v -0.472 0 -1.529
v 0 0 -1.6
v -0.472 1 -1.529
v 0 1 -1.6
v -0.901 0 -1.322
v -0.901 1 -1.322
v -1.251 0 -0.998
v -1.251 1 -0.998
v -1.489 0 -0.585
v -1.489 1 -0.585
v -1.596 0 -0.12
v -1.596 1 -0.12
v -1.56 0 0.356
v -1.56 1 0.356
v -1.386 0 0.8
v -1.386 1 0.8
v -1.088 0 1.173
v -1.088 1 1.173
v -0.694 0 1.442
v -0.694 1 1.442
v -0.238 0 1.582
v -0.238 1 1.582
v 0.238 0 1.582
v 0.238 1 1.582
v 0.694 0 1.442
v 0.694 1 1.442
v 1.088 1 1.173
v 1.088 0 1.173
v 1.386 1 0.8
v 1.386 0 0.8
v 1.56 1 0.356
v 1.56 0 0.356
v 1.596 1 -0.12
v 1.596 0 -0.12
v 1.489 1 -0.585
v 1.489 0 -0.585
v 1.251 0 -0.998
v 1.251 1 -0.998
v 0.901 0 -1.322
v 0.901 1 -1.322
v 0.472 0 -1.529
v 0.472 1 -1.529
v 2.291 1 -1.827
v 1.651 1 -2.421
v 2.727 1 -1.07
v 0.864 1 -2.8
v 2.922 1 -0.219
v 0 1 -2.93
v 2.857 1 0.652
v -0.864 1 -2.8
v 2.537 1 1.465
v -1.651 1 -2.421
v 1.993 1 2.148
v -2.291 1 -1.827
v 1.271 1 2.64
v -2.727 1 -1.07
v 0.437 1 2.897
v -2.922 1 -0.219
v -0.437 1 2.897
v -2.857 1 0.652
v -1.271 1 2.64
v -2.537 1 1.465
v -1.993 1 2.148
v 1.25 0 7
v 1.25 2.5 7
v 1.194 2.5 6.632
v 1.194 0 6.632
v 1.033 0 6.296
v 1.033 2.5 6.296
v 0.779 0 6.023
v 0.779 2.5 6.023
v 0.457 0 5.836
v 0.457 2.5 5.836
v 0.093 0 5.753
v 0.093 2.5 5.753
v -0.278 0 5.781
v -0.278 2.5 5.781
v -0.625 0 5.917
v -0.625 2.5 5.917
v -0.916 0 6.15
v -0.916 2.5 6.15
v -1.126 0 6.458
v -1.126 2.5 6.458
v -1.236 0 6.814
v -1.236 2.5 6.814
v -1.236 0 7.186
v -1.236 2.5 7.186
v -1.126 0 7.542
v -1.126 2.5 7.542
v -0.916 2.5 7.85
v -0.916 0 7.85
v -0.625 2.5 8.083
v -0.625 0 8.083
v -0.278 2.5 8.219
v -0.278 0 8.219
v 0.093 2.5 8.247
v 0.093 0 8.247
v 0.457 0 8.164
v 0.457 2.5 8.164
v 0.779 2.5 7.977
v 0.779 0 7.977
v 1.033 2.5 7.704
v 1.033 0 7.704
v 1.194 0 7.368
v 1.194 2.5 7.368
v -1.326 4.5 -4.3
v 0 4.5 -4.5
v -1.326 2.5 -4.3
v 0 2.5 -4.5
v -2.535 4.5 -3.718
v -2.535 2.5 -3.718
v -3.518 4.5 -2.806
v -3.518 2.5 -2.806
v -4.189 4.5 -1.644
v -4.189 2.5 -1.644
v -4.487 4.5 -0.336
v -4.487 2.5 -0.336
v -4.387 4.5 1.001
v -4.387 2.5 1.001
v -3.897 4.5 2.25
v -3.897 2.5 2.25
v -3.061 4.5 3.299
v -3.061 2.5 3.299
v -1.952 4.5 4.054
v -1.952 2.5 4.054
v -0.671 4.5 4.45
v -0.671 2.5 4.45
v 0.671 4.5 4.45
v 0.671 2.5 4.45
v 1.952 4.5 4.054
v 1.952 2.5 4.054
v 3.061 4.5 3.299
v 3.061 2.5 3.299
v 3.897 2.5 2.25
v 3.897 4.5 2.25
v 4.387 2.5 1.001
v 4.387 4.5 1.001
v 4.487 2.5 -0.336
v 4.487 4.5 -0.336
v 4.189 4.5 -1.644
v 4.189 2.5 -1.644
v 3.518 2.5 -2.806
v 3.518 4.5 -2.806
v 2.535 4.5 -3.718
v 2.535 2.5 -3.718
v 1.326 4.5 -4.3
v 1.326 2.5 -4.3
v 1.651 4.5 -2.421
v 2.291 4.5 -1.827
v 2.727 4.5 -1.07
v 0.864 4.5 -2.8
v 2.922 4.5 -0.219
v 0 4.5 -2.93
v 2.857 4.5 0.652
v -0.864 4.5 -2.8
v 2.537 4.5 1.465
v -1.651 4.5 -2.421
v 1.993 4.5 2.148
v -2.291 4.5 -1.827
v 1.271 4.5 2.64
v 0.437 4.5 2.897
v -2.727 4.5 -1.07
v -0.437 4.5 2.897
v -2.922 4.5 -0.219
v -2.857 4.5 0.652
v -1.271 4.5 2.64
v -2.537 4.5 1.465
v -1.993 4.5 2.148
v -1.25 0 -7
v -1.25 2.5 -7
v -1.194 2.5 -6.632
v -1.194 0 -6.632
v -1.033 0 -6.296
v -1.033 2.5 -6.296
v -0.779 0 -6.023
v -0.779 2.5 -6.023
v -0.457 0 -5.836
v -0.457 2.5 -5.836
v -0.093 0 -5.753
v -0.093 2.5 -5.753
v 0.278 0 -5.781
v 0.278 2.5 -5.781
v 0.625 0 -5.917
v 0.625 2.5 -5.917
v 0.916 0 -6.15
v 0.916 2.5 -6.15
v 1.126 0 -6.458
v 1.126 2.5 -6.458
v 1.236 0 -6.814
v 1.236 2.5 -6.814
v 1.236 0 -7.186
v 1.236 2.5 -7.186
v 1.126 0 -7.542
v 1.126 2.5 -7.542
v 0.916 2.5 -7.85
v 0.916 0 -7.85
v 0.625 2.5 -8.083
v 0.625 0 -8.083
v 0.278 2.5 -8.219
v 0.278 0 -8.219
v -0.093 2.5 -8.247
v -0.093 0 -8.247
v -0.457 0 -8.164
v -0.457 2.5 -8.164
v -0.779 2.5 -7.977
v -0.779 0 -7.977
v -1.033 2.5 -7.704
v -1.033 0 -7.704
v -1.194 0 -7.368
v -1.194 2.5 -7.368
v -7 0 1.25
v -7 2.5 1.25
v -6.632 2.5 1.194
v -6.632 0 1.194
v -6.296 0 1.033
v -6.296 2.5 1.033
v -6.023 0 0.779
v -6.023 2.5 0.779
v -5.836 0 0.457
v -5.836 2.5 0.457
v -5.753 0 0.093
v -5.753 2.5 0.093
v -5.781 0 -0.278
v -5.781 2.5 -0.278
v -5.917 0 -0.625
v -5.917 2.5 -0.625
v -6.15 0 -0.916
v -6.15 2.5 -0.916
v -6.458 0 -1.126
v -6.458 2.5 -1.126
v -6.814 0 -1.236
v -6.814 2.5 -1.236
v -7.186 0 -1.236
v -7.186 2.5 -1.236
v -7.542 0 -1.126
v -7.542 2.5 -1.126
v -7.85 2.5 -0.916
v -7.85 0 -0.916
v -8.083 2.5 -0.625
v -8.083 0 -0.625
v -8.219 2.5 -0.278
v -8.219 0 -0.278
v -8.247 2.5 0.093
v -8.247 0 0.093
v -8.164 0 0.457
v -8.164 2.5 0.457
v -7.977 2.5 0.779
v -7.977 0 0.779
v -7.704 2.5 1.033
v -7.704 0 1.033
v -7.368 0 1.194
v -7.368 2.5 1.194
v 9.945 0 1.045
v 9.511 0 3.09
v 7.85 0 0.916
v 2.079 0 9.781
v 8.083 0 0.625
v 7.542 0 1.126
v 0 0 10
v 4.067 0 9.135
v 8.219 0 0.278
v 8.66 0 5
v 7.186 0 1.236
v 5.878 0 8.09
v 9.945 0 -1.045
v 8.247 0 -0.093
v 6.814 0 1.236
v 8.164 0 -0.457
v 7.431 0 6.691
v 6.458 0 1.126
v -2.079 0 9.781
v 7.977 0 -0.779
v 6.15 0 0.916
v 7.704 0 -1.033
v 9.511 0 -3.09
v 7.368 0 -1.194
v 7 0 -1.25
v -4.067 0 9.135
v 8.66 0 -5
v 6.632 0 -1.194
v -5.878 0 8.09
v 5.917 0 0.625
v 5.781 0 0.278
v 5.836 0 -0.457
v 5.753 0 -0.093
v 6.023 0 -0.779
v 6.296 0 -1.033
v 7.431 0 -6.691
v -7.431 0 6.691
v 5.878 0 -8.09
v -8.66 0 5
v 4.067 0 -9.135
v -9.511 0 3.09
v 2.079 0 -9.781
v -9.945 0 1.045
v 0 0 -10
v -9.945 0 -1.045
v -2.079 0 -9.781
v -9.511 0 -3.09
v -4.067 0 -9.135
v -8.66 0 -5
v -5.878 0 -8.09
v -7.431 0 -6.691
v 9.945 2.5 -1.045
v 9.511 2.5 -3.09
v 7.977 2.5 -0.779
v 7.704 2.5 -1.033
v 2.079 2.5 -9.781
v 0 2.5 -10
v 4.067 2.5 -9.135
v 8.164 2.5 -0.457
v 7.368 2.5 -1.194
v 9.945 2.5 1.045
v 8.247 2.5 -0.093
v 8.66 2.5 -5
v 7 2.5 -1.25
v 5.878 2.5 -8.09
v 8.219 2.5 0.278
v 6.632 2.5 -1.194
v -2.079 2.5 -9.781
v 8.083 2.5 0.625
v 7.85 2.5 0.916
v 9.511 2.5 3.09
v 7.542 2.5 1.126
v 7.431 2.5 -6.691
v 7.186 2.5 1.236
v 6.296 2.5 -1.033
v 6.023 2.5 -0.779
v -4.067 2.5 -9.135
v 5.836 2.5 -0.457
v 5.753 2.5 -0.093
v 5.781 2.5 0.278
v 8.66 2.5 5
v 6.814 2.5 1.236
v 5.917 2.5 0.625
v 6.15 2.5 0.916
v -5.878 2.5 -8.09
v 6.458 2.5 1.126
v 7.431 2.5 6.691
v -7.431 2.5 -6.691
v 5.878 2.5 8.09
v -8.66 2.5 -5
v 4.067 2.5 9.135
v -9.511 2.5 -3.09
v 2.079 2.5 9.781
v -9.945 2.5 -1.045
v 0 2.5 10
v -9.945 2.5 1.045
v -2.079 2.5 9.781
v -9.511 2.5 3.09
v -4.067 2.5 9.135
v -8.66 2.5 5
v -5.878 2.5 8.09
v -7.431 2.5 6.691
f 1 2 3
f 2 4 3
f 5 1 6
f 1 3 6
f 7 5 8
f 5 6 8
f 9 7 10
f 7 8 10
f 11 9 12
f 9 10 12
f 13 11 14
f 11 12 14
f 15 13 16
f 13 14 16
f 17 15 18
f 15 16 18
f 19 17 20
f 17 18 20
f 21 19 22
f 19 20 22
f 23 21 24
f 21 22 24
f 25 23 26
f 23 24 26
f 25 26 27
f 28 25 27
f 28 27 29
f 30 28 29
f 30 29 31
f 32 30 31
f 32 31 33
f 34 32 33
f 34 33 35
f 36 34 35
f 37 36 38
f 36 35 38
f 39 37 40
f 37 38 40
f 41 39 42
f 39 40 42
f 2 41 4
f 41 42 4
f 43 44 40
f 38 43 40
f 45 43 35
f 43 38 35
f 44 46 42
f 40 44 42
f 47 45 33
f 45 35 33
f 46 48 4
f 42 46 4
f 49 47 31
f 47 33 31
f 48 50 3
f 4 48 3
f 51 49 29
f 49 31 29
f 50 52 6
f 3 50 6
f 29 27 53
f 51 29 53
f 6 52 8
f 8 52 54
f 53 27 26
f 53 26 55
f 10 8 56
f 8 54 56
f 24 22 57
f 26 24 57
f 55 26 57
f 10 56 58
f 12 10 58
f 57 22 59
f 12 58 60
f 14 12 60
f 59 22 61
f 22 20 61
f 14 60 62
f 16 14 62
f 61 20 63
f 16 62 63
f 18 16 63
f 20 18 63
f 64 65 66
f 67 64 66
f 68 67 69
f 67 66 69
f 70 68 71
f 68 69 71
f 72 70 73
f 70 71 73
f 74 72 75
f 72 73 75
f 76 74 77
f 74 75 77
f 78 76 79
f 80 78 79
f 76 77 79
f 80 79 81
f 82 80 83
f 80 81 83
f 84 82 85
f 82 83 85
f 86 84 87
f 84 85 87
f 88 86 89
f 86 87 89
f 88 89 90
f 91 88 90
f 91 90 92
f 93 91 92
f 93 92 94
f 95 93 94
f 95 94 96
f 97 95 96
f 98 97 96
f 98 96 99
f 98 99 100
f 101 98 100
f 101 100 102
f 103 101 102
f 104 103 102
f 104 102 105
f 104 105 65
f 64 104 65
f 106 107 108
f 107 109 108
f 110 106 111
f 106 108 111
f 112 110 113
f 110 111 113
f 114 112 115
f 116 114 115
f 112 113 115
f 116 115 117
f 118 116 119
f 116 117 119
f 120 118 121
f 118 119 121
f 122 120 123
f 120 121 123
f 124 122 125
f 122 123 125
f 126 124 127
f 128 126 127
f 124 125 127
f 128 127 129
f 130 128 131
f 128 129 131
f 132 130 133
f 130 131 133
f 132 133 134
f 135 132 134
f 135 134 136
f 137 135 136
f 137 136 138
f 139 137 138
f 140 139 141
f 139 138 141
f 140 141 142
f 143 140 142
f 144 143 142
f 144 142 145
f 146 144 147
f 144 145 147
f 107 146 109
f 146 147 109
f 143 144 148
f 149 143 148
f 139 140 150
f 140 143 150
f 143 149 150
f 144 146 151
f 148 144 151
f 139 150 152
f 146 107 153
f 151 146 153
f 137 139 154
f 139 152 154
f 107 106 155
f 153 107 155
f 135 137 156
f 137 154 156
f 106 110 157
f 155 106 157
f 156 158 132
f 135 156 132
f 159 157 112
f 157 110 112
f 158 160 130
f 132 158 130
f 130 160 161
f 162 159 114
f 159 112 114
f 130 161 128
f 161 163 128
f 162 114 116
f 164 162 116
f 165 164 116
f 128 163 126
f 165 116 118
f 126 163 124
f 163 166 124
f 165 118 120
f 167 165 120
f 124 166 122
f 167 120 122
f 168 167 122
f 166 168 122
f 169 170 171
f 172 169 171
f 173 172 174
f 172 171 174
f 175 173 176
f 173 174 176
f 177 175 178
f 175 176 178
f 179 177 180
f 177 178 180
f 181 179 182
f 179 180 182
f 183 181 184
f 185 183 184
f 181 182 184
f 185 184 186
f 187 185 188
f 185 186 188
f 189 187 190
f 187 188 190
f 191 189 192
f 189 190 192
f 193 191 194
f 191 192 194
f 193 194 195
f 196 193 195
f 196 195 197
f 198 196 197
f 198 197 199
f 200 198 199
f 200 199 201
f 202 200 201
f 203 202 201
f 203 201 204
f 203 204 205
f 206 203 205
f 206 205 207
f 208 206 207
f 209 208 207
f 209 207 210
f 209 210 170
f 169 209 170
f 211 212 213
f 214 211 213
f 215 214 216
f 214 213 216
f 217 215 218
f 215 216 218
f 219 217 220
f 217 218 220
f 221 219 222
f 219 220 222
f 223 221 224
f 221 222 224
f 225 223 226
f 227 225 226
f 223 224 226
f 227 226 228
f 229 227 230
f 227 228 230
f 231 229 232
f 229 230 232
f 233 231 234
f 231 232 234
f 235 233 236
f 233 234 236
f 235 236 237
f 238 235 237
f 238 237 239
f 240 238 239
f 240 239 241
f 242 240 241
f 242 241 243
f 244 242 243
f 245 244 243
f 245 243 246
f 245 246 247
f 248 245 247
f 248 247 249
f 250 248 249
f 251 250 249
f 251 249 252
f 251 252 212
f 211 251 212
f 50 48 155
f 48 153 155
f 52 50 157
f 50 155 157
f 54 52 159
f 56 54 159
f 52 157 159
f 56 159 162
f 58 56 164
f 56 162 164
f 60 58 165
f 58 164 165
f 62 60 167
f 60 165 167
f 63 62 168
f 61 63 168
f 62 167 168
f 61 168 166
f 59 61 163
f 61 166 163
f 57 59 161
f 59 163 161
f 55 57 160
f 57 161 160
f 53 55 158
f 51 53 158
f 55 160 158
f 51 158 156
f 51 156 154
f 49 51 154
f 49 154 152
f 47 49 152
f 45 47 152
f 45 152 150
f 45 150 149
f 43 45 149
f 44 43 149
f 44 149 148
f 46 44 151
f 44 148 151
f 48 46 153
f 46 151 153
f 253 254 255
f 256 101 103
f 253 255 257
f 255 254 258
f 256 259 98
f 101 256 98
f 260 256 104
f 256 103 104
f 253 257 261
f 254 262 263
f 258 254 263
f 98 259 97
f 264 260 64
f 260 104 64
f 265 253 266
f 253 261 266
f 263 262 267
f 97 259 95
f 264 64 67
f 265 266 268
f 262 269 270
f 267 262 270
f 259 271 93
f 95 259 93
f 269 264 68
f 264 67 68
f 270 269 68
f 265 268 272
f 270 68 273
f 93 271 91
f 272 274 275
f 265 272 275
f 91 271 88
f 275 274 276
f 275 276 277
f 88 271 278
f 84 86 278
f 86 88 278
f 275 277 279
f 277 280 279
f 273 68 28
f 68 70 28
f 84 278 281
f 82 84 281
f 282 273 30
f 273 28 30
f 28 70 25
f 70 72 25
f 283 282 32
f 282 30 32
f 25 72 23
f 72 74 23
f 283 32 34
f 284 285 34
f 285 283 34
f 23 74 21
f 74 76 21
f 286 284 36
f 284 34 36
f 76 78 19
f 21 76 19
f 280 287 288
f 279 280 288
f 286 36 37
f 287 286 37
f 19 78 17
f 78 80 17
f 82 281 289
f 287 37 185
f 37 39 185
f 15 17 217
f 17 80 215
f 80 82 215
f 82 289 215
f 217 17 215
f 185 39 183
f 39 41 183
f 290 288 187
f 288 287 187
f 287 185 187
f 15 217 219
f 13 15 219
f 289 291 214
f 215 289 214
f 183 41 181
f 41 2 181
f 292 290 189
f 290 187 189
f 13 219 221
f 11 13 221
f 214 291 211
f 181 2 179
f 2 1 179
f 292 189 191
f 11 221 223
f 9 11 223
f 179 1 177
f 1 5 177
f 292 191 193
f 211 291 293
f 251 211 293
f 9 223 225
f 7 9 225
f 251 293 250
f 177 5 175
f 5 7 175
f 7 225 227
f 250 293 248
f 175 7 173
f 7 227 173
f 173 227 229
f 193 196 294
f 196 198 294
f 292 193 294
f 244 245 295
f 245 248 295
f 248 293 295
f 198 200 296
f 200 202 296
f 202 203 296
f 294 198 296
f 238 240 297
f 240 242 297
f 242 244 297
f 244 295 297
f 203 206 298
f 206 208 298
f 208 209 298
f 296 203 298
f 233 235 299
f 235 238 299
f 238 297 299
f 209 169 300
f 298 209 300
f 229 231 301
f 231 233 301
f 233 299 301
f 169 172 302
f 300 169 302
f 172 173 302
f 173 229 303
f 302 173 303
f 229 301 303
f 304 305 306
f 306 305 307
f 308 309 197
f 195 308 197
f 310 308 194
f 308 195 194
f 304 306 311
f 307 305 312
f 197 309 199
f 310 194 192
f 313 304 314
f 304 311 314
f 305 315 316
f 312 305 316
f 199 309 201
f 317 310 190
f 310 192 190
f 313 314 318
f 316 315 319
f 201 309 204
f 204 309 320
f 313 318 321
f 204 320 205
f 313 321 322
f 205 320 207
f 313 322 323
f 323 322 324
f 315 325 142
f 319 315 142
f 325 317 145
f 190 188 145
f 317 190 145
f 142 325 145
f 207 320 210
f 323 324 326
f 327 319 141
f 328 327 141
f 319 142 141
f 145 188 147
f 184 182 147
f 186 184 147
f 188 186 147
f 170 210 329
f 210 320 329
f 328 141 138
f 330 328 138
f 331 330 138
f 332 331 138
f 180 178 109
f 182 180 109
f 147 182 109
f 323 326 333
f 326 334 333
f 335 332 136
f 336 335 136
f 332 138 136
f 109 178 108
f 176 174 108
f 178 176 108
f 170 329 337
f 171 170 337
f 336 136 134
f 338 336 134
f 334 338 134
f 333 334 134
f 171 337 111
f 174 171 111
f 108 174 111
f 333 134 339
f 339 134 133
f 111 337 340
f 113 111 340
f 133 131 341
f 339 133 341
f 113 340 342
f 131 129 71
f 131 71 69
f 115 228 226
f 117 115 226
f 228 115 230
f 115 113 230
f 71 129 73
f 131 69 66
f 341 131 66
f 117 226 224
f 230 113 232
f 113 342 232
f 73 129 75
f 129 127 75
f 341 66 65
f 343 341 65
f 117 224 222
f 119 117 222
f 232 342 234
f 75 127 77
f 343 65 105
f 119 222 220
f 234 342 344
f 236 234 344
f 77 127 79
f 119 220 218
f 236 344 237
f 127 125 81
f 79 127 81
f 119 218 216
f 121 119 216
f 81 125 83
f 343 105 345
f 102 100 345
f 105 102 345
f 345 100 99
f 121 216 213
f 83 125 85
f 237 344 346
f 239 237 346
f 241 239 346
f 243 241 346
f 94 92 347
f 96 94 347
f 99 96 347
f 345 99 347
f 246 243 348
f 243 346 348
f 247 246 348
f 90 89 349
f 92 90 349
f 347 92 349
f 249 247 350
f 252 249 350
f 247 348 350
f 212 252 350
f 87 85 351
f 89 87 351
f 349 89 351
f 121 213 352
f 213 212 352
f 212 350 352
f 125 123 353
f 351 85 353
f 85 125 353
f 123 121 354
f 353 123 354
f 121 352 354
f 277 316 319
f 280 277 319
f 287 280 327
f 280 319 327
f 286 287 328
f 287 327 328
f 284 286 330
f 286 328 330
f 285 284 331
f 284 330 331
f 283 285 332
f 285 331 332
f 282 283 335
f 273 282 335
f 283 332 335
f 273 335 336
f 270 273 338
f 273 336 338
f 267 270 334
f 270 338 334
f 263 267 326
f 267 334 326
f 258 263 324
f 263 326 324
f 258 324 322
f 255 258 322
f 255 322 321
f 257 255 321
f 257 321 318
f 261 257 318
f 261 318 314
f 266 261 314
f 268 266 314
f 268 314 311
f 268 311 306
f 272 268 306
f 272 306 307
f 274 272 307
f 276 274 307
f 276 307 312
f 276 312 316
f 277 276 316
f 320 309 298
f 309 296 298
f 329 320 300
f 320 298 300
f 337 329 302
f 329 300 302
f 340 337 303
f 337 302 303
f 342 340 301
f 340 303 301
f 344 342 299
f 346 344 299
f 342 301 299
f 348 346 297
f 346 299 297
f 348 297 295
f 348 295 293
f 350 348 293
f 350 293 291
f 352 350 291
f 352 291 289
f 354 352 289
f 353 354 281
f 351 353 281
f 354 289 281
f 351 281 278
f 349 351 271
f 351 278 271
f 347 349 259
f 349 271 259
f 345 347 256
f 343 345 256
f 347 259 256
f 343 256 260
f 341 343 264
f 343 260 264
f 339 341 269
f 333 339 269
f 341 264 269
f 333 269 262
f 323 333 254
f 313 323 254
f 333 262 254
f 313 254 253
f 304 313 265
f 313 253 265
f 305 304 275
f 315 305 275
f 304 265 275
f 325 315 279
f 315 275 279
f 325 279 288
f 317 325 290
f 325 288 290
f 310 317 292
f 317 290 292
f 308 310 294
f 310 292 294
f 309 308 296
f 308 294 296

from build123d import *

# Parameters (mm, degrees)
M3_TAPPED_HOLE1_D = 2.5
CIRPATTERN1_COUNT = 4


with BuildPart() as part:
    # Sketch1 → Revolve1 (revolve)
    with BuildSketch(Plane(origin=(0, 0, 0), x_dir=(0, 0, -1), z_dir=(1, 0, 0))):
        Polygon((1.6, 0), (1.6, 1), (2.93, 1), (2.93, 4.5), (4.5, 4.5), (4.5, 2.5), (10, 2.5), (10, 0), align=None)
    revolve(axis=Axis((0, 0, 0), (0, 1, 0)))

    # M3 Tapped Hole1 (through all)
    with Locations(Plane(origin=(0, 0, 0), x_dir=(-1, 0, 0), z_dir=(0, -1, 0))):
        with Locations((0, -7)):
            m3_tapped_hole1 = Hole(M3_TAPPED_HOLE1_D / 2)

    # CirPattern1: M3 Tapped Hole1 ×4 about axis
    cirpattern1_axis = Axis((0, 0, 0), (0, 1, 0))
    for i in range(1, CIRPATTERN1_COUNT):
        add(m3_tapped_hole1.rotate(cirpattern1_axis, i * 360 / CIRPATTERN1_COUNT), mode=Mode.SUBTRACT)


solid = part.part
